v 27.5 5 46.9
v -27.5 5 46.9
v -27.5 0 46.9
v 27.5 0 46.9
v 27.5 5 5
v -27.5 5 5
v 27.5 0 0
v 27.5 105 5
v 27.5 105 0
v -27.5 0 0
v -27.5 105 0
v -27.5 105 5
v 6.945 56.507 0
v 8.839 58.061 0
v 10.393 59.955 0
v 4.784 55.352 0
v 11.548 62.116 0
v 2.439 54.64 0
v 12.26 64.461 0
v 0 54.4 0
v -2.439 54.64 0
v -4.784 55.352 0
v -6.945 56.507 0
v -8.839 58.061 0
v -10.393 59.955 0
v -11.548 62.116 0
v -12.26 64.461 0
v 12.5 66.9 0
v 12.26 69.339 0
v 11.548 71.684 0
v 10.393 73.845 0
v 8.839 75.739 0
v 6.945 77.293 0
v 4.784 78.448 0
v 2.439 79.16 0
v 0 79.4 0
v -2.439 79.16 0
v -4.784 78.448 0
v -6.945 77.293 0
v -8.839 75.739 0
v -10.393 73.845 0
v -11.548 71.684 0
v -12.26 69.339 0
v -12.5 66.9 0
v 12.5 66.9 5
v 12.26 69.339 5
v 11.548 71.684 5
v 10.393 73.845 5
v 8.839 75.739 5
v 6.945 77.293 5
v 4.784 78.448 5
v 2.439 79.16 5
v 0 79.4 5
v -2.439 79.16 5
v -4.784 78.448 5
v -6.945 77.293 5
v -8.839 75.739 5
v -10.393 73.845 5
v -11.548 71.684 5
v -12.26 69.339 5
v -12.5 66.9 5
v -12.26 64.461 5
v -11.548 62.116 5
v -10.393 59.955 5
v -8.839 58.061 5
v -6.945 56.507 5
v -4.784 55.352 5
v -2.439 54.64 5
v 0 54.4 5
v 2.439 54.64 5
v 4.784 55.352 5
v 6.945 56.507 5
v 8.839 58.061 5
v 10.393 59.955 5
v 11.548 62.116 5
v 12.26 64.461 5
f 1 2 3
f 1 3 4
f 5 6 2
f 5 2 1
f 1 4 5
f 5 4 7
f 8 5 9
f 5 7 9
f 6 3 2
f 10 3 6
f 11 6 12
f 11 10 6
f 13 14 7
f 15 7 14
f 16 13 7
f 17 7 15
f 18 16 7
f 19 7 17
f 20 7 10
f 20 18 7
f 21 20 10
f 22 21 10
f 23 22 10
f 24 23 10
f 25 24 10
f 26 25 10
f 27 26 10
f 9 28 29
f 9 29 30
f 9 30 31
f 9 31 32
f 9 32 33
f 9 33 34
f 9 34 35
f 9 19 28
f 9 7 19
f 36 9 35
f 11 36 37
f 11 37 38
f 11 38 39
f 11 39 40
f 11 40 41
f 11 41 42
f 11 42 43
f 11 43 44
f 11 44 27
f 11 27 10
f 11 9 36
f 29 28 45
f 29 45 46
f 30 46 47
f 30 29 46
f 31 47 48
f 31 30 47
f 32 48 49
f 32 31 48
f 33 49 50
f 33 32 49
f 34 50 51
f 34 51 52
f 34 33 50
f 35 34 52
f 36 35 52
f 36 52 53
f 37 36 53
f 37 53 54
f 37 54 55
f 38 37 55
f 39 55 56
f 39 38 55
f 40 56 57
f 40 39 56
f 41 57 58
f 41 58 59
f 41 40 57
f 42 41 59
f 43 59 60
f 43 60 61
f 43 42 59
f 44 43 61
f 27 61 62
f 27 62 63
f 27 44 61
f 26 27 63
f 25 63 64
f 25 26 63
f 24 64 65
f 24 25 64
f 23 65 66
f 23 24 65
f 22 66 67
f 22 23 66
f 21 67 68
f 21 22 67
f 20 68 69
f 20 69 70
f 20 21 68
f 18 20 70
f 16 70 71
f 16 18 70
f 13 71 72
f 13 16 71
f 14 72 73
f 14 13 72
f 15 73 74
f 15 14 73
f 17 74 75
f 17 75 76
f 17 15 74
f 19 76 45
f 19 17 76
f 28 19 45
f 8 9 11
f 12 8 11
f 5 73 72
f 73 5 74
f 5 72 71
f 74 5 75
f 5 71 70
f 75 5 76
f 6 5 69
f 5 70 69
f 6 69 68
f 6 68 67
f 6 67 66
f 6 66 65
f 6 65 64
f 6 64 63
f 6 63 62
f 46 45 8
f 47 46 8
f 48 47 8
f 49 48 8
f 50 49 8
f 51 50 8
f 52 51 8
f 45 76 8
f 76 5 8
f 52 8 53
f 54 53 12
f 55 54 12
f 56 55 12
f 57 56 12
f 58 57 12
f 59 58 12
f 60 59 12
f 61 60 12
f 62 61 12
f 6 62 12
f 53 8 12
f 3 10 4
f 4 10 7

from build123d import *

# Parameters (mm, degrees)
CROQUIS1_R              = 12.5
SALIENTE_EXTRUIR1_DEPTH = 5
CROQUIS2_W              = 55
CROQUIS2_H              = 5
SALIENTE_EXTRUIR2_DEPTH = 41.9


with BuildPart() as part:
    # Croquis1 → Saliente-Extruir1 (new body)
    with BuildSketch(Plane.XY):
        Polygon((0, 105), (27.5, 105), (27.5, 0), (-27.5, 0), (-27.5, 105), align=None)
        with Locations((0, 66.9)):
            Circle(CROQUIS1_R, mode=Mode.SUBTRACT)
    extrude(amount=SALIENTE_EXTRUIR1_DEPTH)

    # Croquis2 → Saliente-Extruir2 (add)
    with BuildSketch(Plane.XY.offset(5)):
        with Locations((0, 2.5)):
            Rectangle(CROQUIS2_W, CROQUIS2_H)
    extrude(amount=SALIENTE_EXTRUIR2_DEPTH)


solid = part.part
